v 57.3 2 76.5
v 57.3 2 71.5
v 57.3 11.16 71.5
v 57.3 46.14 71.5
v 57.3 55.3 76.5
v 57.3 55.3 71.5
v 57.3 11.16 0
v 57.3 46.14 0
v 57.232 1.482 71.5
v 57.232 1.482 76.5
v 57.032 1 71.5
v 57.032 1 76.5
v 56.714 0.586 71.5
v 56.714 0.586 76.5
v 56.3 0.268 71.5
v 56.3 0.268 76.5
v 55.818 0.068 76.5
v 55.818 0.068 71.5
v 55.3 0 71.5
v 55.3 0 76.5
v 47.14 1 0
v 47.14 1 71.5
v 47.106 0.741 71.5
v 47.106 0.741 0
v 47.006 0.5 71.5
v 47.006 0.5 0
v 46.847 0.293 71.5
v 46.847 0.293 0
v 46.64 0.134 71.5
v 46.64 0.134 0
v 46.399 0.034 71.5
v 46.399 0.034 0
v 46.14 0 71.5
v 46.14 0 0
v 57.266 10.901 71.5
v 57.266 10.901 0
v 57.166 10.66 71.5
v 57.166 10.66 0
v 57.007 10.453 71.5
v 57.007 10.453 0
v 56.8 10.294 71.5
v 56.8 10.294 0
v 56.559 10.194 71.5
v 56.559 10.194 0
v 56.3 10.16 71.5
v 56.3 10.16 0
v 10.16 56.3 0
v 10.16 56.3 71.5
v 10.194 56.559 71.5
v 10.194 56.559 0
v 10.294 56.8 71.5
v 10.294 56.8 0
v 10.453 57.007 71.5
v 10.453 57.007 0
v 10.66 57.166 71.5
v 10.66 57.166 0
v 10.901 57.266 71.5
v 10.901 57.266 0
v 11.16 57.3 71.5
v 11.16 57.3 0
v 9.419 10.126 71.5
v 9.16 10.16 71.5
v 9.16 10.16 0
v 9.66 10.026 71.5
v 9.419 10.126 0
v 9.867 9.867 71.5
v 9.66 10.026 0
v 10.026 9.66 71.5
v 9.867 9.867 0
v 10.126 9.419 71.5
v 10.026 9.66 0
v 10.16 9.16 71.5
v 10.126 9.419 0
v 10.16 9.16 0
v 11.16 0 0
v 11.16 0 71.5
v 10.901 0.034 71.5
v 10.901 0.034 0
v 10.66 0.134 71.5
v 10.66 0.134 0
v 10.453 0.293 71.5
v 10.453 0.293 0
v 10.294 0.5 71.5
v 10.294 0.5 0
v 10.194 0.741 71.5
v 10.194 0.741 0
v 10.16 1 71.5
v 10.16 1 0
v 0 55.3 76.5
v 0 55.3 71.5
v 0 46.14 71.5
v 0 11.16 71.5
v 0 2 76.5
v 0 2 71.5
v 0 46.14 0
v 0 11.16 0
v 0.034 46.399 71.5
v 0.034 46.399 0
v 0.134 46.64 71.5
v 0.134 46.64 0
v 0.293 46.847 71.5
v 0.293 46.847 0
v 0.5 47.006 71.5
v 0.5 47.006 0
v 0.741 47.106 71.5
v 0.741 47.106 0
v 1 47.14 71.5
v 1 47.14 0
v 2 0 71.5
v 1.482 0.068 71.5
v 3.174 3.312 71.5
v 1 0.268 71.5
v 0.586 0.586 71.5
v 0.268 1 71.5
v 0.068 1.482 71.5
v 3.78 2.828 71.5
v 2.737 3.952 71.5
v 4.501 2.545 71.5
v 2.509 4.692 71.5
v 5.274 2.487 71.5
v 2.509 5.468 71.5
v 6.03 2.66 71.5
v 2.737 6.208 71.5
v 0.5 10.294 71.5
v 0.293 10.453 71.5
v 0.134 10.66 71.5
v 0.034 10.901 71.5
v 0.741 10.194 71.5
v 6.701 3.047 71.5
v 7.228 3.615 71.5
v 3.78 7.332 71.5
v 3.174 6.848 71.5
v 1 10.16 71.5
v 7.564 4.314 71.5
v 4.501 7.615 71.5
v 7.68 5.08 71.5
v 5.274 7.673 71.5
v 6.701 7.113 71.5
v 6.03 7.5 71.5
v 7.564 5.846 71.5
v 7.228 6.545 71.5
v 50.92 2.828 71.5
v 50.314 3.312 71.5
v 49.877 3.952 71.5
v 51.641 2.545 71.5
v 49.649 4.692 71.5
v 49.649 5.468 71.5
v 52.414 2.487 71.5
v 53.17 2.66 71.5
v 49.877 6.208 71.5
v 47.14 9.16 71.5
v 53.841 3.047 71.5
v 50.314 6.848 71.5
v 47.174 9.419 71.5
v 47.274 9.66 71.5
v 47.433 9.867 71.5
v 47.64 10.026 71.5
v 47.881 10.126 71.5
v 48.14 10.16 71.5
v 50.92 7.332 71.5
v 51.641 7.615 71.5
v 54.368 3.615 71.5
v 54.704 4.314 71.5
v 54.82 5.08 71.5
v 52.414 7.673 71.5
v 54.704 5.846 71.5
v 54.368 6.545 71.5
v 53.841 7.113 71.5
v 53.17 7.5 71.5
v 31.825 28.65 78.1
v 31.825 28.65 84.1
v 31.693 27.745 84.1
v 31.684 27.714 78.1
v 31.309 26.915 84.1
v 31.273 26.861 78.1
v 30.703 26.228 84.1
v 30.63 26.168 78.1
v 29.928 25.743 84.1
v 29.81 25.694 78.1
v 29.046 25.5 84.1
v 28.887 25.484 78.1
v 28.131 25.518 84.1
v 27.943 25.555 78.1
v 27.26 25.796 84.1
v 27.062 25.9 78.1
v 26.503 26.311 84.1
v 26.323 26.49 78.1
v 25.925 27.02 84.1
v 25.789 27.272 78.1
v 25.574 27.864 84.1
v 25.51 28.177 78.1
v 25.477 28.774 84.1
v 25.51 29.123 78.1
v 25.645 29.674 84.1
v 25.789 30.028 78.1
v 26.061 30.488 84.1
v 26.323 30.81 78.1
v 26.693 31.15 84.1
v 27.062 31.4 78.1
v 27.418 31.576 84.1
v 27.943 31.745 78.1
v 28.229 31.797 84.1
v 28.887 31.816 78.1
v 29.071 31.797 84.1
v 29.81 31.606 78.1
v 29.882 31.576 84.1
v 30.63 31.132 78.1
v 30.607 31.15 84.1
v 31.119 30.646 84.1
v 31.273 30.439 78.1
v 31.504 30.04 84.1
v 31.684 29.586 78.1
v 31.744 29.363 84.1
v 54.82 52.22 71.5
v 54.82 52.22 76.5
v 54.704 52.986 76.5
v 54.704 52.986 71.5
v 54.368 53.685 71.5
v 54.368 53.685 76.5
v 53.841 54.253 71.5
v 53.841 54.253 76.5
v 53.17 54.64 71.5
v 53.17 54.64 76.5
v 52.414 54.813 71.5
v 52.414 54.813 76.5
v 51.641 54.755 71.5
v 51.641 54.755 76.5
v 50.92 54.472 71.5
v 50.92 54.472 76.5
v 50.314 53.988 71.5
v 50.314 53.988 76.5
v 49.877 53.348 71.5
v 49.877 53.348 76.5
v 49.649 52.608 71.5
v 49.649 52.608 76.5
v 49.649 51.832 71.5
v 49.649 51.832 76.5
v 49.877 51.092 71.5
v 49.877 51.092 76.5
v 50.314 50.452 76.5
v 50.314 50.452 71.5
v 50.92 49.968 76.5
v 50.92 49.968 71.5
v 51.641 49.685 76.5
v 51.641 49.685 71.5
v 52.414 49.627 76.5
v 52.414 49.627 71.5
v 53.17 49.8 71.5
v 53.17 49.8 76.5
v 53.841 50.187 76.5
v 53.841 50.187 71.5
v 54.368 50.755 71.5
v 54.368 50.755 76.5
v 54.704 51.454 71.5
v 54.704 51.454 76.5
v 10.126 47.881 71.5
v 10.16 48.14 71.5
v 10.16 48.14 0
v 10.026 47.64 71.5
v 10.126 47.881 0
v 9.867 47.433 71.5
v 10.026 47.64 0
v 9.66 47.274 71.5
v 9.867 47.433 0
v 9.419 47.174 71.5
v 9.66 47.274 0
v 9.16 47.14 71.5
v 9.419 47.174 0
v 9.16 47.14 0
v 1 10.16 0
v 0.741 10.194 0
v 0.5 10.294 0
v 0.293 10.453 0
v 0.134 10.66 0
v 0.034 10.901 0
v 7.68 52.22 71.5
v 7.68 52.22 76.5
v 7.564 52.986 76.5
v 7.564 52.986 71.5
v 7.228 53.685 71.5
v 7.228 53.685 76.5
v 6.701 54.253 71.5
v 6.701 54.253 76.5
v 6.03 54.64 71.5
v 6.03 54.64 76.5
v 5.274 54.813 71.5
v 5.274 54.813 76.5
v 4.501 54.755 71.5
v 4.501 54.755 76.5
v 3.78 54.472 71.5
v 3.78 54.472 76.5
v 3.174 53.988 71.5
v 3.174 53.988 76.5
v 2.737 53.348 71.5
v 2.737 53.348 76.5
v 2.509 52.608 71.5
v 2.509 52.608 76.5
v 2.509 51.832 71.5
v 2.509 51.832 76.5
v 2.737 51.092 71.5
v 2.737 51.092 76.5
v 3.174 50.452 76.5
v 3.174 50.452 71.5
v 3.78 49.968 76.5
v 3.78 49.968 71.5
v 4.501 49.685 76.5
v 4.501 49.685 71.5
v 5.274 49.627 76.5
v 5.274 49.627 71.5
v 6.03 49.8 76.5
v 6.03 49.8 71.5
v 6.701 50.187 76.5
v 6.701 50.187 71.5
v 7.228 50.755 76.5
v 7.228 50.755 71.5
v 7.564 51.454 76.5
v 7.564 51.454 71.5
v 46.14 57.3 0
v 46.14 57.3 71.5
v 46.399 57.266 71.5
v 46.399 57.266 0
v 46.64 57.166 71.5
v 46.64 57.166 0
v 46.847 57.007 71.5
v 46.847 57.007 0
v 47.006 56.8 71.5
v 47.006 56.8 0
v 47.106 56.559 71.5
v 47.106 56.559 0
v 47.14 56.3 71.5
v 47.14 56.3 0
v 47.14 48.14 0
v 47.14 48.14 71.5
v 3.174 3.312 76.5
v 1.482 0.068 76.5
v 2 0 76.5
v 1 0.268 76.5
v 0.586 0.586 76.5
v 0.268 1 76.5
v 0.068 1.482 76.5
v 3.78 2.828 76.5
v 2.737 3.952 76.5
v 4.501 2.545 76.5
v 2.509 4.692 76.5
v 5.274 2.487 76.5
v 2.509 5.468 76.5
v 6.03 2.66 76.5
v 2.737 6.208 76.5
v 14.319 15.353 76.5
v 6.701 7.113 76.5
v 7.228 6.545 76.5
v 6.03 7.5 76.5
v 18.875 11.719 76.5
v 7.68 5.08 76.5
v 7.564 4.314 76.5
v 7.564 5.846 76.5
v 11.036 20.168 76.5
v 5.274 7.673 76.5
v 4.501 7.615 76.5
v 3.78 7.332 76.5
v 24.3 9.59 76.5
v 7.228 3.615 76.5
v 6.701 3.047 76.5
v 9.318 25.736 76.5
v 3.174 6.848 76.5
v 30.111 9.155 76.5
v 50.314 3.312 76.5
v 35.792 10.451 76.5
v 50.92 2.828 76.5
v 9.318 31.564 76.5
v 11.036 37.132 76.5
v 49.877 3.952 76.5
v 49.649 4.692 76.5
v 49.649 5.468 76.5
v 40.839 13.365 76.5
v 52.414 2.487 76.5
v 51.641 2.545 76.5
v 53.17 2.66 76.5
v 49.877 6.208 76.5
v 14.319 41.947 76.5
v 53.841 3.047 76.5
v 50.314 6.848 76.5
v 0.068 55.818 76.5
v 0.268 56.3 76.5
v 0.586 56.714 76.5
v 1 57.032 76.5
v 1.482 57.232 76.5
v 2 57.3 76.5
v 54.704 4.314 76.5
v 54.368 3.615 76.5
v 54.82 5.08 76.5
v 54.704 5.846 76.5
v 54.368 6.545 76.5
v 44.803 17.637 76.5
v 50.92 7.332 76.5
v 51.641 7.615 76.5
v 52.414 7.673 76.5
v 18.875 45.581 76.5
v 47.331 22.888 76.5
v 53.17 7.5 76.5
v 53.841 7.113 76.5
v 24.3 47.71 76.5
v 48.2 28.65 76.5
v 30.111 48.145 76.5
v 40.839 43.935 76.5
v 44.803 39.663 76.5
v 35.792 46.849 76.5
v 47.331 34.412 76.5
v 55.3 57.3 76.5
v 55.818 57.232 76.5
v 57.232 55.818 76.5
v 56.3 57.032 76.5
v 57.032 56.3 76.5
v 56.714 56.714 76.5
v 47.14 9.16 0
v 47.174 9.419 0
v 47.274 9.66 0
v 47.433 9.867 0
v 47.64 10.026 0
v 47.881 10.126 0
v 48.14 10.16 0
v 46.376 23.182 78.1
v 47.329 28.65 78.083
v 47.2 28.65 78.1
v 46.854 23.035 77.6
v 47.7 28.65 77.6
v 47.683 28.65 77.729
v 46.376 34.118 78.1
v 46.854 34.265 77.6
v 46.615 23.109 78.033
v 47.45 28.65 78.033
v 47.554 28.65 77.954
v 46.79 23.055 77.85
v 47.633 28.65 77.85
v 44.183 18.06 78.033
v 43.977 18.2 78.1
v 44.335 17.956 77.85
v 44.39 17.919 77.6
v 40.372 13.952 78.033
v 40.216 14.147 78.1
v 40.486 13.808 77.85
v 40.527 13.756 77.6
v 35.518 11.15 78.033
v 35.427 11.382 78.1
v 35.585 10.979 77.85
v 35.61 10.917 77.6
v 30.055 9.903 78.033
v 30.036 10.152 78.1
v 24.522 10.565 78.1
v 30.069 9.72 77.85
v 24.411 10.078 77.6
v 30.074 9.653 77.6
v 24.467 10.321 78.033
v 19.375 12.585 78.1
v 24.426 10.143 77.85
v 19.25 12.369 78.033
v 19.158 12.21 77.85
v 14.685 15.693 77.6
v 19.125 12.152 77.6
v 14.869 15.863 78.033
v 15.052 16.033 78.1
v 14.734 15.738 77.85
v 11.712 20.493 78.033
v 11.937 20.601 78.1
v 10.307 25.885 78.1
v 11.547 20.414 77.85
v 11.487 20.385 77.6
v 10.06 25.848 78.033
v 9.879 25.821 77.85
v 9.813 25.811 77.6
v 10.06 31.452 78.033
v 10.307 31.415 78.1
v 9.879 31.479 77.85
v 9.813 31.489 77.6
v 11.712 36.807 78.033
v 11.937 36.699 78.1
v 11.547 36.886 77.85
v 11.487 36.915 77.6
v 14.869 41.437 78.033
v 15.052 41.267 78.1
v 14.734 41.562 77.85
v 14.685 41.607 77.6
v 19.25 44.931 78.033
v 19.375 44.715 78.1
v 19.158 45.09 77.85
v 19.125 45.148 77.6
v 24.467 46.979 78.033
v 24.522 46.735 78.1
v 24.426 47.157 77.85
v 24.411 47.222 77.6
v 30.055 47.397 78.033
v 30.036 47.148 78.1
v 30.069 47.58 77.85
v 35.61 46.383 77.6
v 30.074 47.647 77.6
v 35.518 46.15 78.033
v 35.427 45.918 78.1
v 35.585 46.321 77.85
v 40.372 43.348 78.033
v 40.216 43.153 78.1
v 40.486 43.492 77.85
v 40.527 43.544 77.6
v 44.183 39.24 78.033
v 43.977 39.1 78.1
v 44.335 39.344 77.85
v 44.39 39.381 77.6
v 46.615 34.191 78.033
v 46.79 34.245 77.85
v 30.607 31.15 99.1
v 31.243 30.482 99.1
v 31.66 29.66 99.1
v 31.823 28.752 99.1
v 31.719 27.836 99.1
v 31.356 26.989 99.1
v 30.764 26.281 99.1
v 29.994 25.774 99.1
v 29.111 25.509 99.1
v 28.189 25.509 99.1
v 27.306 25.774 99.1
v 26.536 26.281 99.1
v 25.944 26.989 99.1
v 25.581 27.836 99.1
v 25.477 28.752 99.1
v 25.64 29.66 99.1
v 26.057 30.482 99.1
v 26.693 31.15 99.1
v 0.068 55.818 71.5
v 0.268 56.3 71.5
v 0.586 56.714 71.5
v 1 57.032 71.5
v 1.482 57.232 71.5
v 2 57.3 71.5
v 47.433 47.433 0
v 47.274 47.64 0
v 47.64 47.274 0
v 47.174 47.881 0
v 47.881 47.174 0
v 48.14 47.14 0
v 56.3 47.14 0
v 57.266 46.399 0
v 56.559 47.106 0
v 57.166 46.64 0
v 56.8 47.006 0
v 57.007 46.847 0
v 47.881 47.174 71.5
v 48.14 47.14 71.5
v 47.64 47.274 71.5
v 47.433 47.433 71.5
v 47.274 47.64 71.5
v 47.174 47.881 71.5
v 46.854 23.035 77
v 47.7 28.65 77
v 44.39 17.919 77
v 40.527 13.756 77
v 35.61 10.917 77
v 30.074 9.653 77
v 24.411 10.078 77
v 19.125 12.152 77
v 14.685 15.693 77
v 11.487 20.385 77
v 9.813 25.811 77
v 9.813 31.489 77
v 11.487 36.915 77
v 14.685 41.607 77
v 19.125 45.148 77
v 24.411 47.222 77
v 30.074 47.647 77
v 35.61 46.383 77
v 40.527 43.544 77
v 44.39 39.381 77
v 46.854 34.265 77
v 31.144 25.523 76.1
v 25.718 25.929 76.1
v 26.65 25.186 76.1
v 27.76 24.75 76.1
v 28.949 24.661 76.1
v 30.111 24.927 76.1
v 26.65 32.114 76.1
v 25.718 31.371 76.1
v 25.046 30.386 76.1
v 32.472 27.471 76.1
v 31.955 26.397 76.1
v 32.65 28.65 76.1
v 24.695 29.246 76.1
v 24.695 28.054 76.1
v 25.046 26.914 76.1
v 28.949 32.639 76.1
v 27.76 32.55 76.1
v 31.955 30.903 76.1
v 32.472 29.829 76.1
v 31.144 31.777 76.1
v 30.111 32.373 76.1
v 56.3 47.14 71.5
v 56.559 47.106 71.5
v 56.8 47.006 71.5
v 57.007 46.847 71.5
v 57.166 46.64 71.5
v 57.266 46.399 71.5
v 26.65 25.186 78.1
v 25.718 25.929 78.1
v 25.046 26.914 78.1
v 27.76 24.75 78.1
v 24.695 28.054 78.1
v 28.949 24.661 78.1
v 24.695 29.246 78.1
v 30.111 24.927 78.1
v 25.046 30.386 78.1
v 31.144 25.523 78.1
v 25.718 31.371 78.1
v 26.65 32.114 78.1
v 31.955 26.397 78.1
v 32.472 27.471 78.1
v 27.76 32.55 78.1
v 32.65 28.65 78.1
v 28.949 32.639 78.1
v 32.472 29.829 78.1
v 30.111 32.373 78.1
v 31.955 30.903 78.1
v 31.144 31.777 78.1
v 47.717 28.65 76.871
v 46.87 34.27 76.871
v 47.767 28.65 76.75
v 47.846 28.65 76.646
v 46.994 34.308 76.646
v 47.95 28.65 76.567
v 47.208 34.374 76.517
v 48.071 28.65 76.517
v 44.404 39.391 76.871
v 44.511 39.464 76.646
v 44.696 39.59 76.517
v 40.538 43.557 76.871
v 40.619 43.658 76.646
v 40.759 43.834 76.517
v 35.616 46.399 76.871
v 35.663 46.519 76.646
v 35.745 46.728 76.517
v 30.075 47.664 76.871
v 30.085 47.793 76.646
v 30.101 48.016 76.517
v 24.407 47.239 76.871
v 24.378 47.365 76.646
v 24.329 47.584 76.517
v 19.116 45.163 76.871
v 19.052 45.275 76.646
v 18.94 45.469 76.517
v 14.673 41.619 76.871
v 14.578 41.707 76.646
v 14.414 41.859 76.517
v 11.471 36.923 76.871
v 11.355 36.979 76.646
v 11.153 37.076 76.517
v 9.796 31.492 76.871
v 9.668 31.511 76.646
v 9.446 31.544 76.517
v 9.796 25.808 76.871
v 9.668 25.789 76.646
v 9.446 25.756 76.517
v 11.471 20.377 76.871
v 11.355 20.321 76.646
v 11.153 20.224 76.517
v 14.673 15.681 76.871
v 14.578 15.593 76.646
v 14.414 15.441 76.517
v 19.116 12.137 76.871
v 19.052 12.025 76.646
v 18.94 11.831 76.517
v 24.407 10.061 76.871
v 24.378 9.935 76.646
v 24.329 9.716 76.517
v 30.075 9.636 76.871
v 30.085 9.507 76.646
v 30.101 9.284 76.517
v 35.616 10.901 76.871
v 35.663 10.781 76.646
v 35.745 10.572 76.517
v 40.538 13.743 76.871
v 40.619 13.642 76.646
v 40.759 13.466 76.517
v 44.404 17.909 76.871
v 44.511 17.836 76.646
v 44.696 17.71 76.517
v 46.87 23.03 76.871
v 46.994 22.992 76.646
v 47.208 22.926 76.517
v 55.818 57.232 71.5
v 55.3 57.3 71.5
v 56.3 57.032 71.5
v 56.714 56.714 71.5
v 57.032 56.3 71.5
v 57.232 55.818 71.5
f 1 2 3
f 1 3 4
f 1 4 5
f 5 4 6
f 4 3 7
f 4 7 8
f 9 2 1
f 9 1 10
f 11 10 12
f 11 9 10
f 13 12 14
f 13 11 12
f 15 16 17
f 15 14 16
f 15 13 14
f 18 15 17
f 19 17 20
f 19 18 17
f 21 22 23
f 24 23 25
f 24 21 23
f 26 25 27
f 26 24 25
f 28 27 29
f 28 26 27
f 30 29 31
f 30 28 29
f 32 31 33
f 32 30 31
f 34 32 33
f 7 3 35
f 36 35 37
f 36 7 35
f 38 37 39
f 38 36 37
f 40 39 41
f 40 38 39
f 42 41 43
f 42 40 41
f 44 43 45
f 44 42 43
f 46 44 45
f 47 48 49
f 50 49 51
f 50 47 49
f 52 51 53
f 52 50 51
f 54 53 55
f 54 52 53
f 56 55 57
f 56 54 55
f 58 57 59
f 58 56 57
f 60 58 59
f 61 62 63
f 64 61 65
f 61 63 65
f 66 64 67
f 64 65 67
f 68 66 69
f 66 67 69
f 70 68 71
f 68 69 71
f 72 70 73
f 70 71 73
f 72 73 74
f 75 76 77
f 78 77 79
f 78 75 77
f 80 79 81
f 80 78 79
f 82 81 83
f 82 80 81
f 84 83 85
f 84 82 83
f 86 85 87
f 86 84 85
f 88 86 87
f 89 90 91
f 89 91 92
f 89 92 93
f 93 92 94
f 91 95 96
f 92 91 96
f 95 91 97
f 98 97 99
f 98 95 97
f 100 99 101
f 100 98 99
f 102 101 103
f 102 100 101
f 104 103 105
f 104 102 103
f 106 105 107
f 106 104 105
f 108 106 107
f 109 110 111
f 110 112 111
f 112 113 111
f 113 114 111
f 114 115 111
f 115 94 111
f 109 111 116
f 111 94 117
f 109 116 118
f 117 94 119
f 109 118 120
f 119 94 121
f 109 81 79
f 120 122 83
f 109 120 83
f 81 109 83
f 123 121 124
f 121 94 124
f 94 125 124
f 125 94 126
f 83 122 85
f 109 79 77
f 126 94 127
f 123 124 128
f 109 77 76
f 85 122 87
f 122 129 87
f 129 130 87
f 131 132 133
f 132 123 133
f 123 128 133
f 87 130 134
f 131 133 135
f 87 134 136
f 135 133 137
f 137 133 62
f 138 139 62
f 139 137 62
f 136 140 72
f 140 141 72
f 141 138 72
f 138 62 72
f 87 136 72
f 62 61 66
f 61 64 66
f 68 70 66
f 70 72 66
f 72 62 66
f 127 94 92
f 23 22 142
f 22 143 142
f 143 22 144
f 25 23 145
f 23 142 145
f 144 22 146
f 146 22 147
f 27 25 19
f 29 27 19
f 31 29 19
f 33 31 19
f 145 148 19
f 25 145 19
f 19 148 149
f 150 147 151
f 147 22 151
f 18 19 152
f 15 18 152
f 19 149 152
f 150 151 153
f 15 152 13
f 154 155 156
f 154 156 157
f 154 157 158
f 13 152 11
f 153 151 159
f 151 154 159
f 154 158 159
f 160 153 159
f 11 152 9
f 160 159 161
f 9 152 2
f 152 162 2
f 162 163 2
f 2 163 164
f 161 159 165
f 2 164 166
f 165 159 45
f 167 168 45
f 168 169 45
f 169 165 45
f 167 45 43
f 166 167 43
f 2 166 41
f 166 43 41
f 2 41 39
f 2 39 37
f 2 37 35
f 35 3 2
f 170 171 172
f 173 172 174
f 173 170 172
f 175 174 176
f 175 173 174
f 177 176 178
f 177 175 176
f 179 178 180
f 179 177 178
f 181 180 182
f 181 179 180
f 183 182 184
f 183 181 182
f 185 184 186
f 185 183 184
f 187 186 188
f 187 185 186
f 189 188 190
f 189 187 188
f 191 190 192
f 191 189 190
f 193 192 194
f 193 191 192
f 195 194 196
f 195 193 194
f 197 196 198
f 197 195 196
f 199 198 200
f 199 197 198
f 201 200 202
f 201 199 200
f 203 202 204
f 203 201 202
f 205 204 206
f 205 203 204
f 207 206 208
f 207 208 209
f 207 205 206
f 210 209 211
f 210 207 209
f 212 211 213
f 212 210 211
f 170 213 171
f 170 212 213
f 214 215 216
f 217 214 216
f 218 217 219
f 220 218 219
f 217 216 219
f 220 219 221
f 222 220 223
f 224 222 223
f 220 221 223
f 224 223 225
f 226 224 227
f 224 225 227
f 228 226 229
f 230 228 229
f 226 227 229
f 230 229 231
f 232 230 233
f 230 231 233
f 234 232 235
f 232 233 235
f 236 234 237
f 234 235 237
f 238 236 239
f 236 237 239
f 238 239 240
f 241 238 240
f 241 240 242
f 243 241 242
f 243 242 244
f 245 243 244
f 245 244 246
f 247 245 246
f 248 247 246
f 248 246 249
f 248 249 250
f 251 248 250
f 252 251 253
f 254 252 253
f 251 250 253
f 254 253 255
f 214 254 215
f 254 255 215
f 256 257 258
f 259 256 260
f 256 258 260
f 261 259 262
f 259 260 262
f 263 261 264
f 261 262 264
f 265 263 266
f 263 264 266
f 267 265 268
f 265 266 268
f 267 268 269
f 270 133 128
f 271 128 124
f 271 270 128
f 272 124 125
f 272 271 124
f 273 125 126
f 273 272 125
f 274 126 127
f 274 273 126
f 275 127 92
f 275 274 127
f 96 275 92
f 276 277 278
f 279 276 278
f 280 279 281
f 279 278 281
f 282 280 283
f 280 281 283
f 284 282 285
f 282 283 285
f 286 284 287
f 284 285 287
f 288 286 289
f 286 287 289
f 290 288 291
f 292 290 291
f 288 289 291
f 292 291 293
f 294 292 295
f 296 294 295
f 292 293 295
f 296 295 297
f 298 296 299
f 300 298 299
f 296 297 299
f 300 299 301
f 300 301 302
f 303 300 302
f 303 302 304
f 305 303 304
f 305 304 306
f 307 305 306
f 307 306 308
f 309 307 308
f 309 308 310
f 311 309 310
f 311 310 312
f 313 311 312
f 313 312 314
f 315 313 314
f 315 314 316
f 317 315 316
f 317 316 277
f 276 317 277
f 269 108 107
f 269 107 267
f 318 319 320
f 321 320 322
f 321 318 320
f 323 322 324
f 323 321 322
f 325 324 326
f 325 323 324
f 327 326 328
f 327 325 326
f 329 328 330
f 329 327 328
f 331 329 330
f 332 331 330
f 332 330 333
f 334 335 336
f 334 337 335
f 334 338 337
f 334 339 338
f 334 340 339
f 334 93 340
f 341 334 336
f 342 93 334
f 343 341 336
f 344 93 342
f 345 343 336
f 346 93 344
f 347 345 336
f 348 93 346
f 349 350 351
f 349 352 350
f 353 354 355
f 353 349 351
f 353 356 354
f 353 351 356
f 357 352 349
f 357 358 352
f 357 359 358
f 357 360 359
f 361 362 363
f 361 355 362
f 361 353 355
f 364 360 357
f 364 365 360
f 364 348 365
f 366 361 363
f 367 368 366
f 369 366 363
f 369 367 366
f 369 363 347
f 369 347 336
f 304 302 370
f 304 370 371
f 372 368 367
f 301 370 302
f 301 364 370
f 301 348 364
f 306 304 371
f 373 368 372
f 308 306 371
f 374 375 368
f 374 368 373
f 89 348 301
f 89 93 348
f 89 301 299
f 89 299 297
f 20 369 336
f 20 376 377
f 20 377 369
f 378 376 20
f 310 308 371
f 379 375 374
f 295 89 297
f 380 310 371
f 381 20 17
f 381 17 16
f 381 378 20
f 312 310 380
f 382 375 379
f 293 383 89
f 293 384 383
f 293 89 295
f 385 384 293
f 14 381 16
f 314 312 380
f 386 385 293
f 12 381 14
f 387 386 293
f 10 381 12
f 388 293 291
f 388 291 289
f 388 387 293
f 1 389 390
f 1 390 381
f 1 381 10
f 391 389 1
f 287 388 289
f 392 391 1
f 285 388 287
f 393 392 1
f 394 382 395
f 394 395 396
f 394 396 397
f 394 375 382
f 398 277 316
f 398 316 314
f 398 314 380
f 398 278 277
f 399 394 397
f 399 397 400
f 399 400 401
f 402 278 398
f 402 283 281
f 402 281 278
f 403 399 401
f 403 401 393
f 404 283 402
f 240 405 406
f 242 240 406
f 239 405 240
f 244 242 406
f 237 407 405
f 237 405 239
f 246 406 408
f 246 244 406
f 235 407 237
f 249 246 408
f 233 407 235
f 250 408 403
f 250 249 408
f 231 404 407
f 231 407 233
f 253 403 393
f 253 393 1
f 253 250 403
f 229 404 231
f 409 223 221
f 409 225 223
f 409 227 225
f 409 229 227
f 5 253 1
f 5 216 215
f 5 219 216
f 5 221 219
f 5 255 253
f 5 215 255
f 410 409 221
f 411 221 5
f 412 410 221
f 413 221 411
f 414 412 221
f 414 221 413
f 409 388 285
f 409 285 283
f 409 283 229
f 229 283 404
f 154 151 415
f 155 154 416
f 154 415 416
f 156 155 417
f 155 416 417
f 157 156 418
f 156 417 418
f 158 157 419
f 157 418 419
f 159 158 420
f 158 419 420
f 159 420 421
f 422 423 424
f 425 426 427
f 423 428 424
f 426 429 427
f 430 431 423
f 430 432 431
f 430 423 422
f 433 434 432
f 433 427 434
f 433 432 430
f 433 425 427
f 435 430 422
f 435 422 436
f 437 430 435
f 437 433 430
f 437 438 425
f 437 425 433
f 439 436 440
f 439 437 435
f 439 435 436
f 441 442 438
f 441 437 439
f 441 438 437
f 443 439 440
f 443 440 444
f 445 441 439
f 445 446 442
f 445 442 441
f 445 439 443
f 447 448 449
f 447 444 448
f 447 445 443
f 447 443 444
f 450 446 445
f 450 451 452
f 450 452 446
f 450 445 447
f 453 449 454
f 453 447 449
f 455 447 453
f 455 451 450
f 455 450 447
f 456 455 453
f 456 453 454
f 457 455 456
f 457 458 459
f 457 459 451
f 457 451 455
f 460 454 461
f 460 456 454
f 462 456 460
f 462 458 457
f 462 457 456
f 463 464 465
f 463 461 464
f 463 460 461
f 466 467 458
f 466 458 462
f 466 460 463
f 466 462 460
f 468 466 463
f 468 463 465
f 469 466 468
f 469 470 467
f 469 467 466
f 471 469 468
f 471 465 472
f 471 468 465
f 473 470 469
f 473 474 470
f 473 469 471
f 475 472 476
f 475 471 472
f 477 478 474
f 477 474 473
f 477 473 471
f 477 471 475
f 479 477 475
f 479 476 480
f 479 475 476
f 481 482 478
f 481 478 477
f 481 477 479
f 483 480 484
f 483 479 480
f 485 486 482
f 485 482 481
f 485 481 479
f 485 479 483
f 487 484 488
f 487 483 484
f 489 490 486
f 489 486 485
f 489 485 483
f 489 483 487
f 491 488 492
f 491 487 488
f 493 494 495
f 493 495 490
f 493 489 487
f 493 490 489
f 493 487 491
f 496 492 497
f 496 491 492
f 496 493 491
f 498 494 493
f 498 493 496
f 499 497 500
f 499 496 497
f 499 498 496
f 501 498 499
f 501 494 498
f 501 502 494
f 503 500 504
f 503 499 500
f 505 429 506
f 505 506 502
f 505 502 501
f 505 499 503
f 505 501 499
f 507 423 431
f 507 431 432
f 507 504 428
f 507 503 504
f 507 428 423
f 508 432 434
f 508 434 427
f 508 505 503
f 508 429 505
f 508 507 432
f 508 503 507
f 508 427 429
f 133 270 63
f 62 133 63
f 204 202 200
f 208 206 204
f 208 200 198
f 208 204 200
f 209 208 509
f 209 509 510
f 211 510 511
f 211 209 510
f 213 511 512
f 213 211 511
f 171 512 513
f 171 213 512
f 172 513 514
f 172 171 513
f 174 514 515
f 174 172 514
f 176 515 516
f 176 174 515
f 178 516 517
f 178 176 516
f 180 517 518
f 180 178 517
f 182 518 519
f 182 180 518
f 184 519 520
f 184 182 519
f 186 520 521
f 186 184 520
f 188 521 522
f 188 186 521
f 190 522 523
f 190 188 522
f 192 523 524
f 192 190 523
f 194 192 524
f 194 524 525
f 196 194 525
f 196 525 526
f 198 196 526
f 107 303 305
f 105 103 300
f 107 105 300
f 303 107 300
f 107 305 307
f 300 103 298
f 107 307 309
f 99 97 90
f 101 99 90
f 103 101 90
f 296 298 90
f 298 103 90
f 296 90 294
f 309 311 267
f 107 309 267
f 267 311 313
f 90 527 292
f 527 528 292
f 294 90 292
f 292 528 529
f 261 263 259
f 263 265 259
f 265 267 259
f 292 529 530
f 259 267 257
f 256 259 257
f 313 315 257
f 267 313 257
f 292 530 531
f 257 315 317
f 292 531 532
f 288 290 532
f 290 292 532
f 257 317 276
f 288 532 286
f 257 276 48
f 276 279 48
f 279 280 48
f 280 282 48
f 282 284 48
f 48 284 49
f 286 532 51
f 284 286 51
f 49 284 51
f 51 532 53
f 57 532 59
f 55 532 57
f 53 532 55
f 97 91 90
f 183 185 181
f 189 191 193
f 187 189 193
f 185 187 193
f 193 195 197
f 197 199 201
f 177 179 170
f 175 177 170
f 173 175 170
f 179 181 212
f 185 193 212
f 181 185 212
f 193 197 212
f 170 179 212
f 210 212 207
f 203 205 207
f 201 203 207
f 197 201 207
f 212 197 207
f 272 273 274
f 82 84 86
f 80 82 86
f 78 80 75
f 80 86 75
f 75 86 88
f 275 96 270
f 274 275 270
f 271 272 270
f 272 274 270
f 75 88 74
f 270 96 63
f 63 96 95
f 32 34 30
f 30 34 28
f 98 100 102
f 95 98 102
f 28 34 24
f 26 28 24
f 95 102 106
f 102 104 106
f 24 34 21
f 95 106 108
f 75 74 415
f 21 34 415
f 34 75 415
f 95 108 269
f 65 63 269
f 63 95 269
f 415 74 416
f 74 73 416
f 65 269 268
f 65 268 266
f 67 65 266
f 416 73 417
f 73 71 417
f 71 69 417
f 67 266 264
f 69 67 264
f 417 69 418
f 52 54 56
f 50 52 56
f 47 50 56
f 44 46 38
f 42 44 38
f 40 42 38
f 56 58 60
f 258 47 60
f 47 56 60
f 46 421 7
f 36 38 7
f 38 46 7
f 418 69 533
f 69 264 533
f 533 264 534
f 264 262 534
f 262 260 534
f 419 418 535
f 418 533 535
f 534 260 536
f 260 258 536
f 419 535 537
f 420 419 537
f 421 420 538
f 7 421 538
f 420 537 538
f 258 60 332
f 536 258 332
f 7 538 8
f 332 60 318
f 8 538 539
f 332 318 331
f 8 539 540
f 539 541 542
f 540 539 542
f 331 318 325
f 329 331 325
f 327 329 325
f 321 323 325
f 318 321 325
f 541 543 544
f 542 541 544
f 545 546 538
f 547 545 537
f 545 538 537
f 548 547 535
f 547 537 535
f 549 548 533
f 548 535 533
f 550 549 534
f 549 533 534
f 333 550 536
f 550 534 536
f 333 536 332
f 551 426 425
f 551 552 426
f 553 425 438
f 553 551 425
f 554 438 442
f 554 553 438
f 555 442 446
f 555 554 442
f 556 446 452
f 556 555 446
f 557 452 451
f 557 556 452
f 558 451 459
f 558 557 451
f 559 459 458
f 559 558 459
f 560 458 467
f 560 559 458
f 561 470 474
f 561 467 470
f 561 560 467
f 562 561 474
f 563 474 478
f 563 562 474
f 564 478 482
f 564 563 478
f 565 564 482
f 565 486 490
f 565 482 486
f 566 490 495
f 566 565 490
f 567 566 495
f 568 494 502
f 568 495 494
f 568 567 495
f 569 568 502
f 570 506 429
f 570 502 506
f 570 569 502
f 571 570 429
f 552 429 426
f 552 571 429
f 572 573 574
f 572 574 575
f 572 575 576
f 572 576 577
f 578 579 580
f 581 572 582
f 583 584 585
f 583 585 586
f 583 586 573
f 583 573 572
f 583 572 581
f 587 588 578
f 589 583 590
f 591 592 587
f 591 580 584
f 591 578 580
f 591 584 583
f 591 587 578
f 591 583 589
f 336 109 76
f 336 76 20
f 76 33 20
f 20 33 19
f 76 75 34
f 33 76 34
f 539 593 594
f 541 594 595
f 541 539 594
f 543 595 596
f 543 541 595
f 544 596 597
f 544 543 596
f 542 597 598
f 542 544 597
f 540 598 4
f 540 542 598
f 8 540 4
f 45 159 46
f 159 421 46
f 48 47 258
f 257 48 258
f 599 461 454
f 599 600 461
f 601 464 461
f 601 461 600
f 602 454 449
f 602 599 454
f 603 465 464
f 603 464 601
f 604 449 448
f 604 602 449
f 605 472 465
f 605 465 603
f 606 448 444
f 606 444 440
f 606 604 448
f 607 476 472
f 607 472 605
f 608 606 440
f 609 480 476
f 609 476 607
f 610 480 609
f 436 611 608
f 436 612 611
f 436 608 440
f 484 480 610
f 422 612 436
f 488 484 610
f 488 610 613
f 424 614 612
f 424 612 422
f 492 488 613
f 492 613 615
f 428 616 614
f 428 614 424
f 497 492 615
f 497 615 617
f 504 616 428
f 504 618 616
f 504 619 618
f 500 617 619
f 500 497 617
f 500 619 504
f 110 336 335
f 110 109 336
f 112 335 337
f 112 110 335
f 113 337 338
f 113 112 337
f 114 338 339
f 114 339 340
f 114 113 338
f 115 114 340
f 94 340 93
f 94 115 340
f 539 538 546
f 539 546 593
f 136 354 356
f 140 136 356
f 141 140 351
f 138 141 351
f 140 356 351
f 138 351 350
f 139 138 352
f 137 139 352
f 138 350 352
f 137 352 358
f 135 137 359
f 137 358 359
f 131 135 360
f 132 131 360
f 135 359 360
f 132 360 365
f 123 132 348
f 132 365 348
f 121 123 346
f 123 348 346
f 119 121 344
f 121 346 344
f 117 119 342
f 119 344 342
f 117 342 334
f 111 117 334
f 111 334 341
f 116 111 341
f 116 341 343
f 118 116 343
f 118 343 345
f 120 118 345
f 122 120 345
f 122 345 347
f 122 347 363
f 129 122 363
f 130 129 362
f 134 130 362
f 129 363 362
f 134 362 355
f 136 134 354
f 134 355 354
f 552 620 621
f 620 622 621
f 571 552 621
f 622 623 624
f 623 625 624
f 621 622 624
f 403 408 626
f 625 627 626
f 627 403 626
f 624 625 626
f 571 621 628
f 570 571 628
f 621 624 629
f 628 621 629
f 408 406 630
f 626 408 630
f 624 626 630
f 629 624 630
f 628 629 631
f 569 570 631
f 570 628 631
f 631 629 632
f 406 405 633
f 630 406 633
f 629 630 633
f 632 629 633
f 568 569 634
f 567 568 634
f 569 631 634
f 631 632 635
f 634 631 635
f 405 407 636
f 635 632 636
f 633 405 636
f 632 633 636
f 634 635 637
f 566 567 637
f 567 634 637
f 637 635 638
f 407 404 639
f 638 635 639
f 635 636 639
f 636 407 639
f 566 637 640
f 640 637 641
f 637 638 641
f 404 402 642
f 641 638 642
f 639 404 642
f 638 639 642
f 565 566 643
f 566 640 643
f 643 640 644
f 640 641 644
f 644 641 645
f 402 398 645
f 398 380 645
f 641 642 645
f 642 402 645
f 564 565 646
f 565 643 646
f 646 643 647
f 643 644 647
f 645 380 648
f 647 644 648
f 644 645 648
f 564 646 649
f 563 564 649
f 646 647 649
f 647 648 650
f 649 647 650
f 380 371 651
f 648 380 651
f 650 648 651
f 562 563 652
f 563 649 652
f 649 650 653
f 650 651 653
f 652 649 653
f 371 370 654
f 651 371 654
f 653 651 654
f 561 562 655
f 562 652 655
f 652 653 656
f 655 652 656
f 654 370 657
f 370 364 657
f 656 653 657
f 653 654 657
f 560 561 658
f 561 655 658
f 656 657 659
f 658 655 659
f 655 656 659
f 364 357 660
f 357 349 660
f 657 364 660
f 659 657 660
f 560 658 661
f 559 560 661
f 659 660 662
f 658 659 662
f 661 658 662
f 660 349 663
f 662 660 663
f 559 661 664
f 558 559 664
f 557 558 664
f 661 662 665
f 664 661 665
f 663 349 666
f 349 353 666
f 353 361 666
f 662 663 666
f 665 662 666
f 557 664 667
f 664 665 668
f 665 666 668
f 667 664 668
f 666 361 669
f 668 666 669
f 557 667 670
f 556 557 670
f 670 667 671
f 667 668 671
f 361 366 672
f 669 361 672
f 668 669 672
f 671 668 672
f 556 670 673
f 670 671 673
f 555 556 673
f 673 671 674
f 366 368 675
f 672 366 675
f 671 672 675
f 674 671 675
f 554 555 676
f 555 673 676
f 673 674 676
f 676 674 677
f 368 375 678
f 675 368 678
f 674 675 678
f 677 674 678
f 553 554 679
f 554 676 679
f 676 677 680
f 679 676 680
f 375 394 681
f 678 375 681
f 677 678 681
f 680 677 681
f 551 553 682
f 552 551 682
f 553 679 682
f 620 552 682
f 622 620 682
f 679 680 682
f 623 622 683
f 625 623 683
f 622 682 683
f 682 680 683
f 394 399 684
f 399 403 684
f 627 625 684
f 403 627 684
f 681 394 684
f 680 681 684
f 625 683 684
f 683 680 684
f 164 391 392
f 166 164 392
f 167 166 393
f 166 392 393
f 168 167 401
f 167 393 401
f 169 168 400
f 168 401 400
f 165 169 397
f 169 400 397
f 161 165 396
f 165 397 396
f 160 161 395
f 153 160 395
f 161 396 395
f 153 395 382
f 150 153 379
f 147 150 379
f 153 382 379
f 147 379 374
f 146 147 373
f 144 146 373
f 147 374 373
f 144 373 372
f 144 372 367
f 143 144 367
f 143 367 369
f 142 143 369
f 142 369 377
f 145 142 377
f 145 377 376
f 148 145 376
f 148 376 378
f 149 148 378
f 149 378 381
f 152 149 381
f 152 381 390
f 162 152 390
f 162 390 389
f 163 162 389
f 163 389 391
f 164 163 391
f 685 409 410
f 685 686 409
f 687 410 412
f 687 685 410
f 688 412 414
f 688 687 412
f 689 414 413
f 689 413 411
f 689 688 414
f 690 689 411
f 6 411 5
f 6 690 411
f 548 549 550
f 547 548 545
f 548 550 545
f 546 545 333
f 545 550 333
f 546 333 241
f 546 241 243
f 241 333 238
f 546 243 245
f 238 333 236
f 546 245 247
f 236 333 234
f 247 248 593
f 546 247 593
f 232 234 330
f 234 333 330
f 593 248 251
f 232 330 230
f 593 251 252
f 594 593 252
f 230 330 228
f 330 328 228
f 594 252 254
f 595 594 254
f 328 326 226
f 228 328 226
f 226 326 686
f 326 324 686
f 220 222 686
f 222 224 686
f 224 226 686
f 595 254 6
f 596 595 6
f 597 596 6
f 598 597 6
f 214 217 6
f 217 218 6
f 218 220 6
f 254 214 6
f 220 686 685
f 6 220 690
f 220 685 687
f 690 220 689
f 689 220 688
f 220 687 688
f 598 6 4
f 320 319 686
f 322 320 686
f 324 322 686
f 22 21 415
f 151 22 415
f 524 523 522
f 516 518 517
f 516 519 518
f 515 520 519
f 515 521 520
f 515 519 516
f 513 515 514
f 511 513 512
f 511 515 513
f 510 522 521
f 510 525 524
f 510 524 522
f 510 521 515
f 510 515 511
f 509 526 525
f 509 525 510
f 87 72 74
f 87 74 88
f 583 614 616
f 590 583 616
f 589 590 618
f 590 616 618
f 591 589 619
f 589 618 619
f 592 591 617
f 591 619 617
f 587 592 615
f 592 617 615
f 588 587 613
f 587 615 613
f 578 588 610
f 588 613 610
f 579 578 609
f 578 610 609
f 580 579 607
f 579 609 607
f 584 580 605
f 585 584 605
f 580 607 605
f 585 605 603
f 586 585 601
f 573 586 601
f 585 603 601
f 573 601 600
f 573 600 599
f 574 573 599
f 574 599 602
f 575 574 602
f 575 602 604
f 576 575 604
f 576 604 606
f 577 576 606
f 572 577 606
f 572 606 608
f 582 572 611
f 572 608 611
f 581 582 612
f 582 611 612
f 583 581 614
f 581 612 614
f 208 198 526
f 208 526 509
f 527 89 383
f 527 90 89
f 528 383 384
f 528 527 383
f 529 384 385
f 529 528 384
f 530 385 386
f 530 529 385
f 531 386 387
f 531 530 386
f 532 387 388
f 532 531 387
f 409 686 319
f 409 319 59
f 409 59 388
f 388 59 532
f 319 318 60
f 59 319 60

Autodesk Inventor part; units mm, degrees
ref_plane "YZ Plane" through (0, 0, 0) normal (1, 0, 0) x (0, 1, 0)
ref_plane "XZ Plane" through (0, 0, 0) normal (0, 1, 0) x (-1, 0, 0)
ref_plane "XY Plane" through (0, 0, 0) normal (0, 0, 1) x (1, 0, 0)
sketch "Sketch1" plane through (0, 0, 0) normal (0, 0, 1) x (1, 0, 0)
  line L0 (11.16, 0) -> (46.14, 0)
  line L1 (57.3, 11.16) -> (57.3, 46.14)
  line L2 (46.14, 57.3) -> (11.16, 57.3)
  line L3 (0, 46.14) -> (0, 11.16)
  line L4 (0, 0) -> (0, 10.16)
  line L5 (1, 10.16) -> (9.16, 10.16)
  line L6 (10.16, 9.16) -> (10.16, 1)
  line L7 (57.3, 0) -> (47.14, 0)
  line L8 (47.14, 1) -> (47.14, 9.16)
  line L9 (48.14, 10.16) -> (56.3, 10.16)
  line L10 (47.14, 56.3) -> (47.14, 48.14)
  line L11 (48.14, 47.14) -> (56.3, 47.14)
  line L12 (10.16, 56.3) -> (10.16, 48.14)
  line L13 (1, 47.14) -> (9.16, 47.14)
  arc A0 (9.16, 47.14) -> (10.16, 48.14) centre (9.16, 48.14) ccw
  arc A1 (47.14, 48.14) -> (48.14, 47.14) centre (48.14, 48.14) ccw
  arc A2 (10.16, 9.16) -> (9.16, 10.16) centre (9.16, 9.16) ccw
  arc A3 (48.14, 10.16) -> (47.14, 9.16) centre (48.14, 9.16) ccw
  arc A4 (11.16, 57.3) -> (10.16, 56.3) centre (11.16, 56.3) ccw
  arc A5 (47.14, 56.3) -> (46.14, 57.3) centre (46.14, 56.3) ccw
  arc A6 (57.3, 46.14) -> (56.3, 47.14) centre (56.3, 46.14) ccw
  arc A7 (56.3, 10.16) -> (57.3, 11.16) centre (56.3, 11.16) ccw
  arc A8 (46.14, 0) -> (47.14, 1) centre (46.14, 1) ccw
  arc A9 (10.16, 1) -> (11.16, 0) centre (11.16, 1) ccw
  arc A10 (0, 11.16) -> (1, 10.16) centre (1, 11.16) ccw
  arc A11 (1, 47.14) -> (0, 46.14) centre (1, 46.14) ccw
  point P0 (57.3, 57.3)
  point P1 (0, 47.14)
  point P2 (10.16, 10.16)
  point P3 (47.14, 10.16)
  point P4 (47.14, 47.14)
  point P5 (10.16, 47.14)
  point P6 (10.16, 57.3)
  point P7 (47.14, 57.3)
  point P8 (57.3, 10.16)
  dimension "d25" = 57.3
  dimension "d26" = 57.3
  dimension "d27" = 10.16
  dimension "d28" = 10.16
  dimension "d29" = 10.16
  dimension "d30" = 10.16
  dimension "d31" = 1
extrude "Extrusion4" add sketch "Sketch1" along normal blind 76.5
sketch "Sketch4" plane through (0, 0, 76.5) normal (0, 0, 1) x (1, 0, 0)
  arc A0 (10.16, 1) -> (11.16, 0) centre (11.16, 1) ccw projected
  line L0 (11.16, 0) -> (46.14, 0) projected
  arc A1 (46.14, 0) -> (47.14, 1) centre (46.14, 1) ccw projected
  line L1 (47.14, 1) -> (47.14, 9.16) projected
  arc A2 (48.14, 10.16) -> (47.14, 9.16) centre (48.14, 9.16) ccw projected
  line L2 (48.14, 10.16) -> (56.3, 10.16) projected
  arc A3 (56.3, 10.16) -> (57.3, 11.16) centre (56.3, 11.16) ccw projected
  line L3 (57.3, 11.16) -> (57.3, 46.14) projected
  arc A4 (57.3, 46.14) -> (56.3, 47.14) centre (56.3, 46.14) ccw projected
  line L4 (56.3, 47.14) -> (48.14, 47.14) projected
  arc A5 (47.14, 48.14) -> (48.14, 47.14) centre (48.14, 48.14) ccw projected
  line L5 (47.14, 48.14) -> (47.14, 56.3) projected
  arc A6 (47.14, 56.3) -> (46.14, 57.3) centre (46.14, 56.3) ccw projected
  line L6 (46.14, 57.3) -> (11.16, 57.3) projected
  arc A7 (11.16, 57.3) -> (10.16, 56.3) centre (11.16, 56.3) ccw projected
  line L7 (10.16, 56.3) -> (10.16, 48.14) projected
  arc A8 (9.16, 47.14) -> (10.16, 48.14) centre (9.16, 48.14) ccw projected
  line L8 (9.16, 47.14) -> (1, 47.14) projected
  arc A9 (1, 47.14) -> (0, 46.14) centre (1, 46.14) ccw projected
  line L9 (0, 46.14) -> (0, 11.16) projected
  arc A10 (0, 11.16) -> (1, 10.16) centre (1, 11.16) ccw projected
  line L10 (1, 10.16) -> (9.16, 10.16) projected
  arc A11 (10.16, 9.16) -> (9.16, 10.16) centre (9.16, 9.16) ccw projected
  line L11 (10.16, 9.16) -> (10.16, 1) projected
  line L12 (0, 0) -> (57.3, 0)
  line L13 (57.3, 0) -> (57.3, 57.3)
  line L14 (57.3, 57.3) -> (0, 57.3)
  line L15 (0, 57.3) -> (0, 0)
  line L16 (0, 57.3) -> (5.08, 57.3)
  line L17 (5.08, 57.3) -> (5.08, 52.22)
  line L18 (57.3, 0) -> (52.22, 0)
  line L19 (52.22, 0) -> (52.22, 5.08)
  circle A12 centre (52.22, 52.22) radius 2.6
  circle A13 centre (5.08, 5.08) radius 2.6
  circle A14 centre (52.22, 5.08) radius 2.6
  circle A15 centre (5.08, 52.22) radius 2.6
  dimension "d34" = 5.08
  dimension "d35" = 5.08
  dimension "d36" = 5.08
  dimension "d37" = 5.08
  dimension "d38" = 5.2
  dimension "d39" = 5.2
  dimension "d40" = 5.2
  dimension "d41" = 5.2
extrude "Extrusion5" add sketch "Sketch4" against normal blind 5
fillet "Fillet1" radius 2 4 edges at (57.3, 57.3, 74) (57.3, 0, 74) (0, 57.3, 74) (0, 0, 74)
sketch "Sketch5" plane through (0, 0, 76.5) normal (0, 0, 1) x (1, 0, 0)
  arc A0 (0, 2) -> (2, 0) centre (2, 2) ccw projected
  line L0 (2, 0) -> (55.3, 0) projected
  arc A1 (55.3, 0) -> (57.3, 2) centre (55.3, 2) ccw projected
  line L1 (57.3, 2) -> (57.3, 55.3) projected
  arc A2 (57.3, 55.3) -> (55.3, 57.3) centre (55.3, 55.3) ccw projected
  line L2 (55.3, 57.3) -> (2, 57.3) projected
  arc A3 (2, 57.3) -> (0, 55.3) centre (2, 55.3) ccw projected
  line L3 (0, 55.3) -> (0, 2) projected
  circle A4 centre (52.22, 52.22) radius 2.6 projected
  circle A5 centre (5.08, 52.22) radius 2.6 projected
  circle A6 centre (52.22, 5.08) radius 2.6 projected
  circle A7 centre (5.08, 5.08) radius 2.6 projected
  circle A8 centre (28.65, 28.65) radius 19.05
  point P0 (0, 0)
  dimension "d45" = 38.1
extrude "Extrusion6" add sketch "Sketch5" along normal blind 1.6 contours A8
sketch "Sketch6" plane through (28.65, 28.65, 78.1) normal (0, 0, 1) x (1, 0, 0)
  circle A0 centre (0, 0) radius 3.175
  point P0 (-28.65, -28.65)
  dimension "d48" = 6.35
extrude "Extrusion7" add sketch "Sketch6" along normal blind 6
sketch "Sketch7" plane through (28.65, 28.65, 84.1) normal (0, 0, 1) x (1, 0, 0)
  arc A0 (-1.9572, 2.5) -> (1.9572, 2.5) centre (0, 0) ccw
  circle A1 centre (0, 0) radius 3.175 projected
  line L0 (0, 0) -> (0, 2.5)
  line L1 (-1.9572, 2.5) -> (1.9572, 2.5)
  point P0 (-28.65, -28.65)
  dimension "d51" = 2.5
extrude "Extrusion8" add sketch "Sketch7" along normal blind 15 contours L1 A0
sketch "Sketch8" plane through (28.65, 28.65, 78.1) normal (0, 0, 1) x (1, 0, 0)
  circle A0 centre (0, 0) radius 3.175
  circle A1 centre (0, 0) radius 4
  point P0 (-28.65, -28.65)
  dimension "d54" = 8
extrude "Extrusion9" cut sketch "Sketch8" against normal blind 2 contours A0 | A1
fillet "Fillet2" radius 0.5 2 edges at (9.6, 28.65, 78.1) (9.6, 28.65, 76.5)
properties part number "0x002" material "Iron, Cast"
